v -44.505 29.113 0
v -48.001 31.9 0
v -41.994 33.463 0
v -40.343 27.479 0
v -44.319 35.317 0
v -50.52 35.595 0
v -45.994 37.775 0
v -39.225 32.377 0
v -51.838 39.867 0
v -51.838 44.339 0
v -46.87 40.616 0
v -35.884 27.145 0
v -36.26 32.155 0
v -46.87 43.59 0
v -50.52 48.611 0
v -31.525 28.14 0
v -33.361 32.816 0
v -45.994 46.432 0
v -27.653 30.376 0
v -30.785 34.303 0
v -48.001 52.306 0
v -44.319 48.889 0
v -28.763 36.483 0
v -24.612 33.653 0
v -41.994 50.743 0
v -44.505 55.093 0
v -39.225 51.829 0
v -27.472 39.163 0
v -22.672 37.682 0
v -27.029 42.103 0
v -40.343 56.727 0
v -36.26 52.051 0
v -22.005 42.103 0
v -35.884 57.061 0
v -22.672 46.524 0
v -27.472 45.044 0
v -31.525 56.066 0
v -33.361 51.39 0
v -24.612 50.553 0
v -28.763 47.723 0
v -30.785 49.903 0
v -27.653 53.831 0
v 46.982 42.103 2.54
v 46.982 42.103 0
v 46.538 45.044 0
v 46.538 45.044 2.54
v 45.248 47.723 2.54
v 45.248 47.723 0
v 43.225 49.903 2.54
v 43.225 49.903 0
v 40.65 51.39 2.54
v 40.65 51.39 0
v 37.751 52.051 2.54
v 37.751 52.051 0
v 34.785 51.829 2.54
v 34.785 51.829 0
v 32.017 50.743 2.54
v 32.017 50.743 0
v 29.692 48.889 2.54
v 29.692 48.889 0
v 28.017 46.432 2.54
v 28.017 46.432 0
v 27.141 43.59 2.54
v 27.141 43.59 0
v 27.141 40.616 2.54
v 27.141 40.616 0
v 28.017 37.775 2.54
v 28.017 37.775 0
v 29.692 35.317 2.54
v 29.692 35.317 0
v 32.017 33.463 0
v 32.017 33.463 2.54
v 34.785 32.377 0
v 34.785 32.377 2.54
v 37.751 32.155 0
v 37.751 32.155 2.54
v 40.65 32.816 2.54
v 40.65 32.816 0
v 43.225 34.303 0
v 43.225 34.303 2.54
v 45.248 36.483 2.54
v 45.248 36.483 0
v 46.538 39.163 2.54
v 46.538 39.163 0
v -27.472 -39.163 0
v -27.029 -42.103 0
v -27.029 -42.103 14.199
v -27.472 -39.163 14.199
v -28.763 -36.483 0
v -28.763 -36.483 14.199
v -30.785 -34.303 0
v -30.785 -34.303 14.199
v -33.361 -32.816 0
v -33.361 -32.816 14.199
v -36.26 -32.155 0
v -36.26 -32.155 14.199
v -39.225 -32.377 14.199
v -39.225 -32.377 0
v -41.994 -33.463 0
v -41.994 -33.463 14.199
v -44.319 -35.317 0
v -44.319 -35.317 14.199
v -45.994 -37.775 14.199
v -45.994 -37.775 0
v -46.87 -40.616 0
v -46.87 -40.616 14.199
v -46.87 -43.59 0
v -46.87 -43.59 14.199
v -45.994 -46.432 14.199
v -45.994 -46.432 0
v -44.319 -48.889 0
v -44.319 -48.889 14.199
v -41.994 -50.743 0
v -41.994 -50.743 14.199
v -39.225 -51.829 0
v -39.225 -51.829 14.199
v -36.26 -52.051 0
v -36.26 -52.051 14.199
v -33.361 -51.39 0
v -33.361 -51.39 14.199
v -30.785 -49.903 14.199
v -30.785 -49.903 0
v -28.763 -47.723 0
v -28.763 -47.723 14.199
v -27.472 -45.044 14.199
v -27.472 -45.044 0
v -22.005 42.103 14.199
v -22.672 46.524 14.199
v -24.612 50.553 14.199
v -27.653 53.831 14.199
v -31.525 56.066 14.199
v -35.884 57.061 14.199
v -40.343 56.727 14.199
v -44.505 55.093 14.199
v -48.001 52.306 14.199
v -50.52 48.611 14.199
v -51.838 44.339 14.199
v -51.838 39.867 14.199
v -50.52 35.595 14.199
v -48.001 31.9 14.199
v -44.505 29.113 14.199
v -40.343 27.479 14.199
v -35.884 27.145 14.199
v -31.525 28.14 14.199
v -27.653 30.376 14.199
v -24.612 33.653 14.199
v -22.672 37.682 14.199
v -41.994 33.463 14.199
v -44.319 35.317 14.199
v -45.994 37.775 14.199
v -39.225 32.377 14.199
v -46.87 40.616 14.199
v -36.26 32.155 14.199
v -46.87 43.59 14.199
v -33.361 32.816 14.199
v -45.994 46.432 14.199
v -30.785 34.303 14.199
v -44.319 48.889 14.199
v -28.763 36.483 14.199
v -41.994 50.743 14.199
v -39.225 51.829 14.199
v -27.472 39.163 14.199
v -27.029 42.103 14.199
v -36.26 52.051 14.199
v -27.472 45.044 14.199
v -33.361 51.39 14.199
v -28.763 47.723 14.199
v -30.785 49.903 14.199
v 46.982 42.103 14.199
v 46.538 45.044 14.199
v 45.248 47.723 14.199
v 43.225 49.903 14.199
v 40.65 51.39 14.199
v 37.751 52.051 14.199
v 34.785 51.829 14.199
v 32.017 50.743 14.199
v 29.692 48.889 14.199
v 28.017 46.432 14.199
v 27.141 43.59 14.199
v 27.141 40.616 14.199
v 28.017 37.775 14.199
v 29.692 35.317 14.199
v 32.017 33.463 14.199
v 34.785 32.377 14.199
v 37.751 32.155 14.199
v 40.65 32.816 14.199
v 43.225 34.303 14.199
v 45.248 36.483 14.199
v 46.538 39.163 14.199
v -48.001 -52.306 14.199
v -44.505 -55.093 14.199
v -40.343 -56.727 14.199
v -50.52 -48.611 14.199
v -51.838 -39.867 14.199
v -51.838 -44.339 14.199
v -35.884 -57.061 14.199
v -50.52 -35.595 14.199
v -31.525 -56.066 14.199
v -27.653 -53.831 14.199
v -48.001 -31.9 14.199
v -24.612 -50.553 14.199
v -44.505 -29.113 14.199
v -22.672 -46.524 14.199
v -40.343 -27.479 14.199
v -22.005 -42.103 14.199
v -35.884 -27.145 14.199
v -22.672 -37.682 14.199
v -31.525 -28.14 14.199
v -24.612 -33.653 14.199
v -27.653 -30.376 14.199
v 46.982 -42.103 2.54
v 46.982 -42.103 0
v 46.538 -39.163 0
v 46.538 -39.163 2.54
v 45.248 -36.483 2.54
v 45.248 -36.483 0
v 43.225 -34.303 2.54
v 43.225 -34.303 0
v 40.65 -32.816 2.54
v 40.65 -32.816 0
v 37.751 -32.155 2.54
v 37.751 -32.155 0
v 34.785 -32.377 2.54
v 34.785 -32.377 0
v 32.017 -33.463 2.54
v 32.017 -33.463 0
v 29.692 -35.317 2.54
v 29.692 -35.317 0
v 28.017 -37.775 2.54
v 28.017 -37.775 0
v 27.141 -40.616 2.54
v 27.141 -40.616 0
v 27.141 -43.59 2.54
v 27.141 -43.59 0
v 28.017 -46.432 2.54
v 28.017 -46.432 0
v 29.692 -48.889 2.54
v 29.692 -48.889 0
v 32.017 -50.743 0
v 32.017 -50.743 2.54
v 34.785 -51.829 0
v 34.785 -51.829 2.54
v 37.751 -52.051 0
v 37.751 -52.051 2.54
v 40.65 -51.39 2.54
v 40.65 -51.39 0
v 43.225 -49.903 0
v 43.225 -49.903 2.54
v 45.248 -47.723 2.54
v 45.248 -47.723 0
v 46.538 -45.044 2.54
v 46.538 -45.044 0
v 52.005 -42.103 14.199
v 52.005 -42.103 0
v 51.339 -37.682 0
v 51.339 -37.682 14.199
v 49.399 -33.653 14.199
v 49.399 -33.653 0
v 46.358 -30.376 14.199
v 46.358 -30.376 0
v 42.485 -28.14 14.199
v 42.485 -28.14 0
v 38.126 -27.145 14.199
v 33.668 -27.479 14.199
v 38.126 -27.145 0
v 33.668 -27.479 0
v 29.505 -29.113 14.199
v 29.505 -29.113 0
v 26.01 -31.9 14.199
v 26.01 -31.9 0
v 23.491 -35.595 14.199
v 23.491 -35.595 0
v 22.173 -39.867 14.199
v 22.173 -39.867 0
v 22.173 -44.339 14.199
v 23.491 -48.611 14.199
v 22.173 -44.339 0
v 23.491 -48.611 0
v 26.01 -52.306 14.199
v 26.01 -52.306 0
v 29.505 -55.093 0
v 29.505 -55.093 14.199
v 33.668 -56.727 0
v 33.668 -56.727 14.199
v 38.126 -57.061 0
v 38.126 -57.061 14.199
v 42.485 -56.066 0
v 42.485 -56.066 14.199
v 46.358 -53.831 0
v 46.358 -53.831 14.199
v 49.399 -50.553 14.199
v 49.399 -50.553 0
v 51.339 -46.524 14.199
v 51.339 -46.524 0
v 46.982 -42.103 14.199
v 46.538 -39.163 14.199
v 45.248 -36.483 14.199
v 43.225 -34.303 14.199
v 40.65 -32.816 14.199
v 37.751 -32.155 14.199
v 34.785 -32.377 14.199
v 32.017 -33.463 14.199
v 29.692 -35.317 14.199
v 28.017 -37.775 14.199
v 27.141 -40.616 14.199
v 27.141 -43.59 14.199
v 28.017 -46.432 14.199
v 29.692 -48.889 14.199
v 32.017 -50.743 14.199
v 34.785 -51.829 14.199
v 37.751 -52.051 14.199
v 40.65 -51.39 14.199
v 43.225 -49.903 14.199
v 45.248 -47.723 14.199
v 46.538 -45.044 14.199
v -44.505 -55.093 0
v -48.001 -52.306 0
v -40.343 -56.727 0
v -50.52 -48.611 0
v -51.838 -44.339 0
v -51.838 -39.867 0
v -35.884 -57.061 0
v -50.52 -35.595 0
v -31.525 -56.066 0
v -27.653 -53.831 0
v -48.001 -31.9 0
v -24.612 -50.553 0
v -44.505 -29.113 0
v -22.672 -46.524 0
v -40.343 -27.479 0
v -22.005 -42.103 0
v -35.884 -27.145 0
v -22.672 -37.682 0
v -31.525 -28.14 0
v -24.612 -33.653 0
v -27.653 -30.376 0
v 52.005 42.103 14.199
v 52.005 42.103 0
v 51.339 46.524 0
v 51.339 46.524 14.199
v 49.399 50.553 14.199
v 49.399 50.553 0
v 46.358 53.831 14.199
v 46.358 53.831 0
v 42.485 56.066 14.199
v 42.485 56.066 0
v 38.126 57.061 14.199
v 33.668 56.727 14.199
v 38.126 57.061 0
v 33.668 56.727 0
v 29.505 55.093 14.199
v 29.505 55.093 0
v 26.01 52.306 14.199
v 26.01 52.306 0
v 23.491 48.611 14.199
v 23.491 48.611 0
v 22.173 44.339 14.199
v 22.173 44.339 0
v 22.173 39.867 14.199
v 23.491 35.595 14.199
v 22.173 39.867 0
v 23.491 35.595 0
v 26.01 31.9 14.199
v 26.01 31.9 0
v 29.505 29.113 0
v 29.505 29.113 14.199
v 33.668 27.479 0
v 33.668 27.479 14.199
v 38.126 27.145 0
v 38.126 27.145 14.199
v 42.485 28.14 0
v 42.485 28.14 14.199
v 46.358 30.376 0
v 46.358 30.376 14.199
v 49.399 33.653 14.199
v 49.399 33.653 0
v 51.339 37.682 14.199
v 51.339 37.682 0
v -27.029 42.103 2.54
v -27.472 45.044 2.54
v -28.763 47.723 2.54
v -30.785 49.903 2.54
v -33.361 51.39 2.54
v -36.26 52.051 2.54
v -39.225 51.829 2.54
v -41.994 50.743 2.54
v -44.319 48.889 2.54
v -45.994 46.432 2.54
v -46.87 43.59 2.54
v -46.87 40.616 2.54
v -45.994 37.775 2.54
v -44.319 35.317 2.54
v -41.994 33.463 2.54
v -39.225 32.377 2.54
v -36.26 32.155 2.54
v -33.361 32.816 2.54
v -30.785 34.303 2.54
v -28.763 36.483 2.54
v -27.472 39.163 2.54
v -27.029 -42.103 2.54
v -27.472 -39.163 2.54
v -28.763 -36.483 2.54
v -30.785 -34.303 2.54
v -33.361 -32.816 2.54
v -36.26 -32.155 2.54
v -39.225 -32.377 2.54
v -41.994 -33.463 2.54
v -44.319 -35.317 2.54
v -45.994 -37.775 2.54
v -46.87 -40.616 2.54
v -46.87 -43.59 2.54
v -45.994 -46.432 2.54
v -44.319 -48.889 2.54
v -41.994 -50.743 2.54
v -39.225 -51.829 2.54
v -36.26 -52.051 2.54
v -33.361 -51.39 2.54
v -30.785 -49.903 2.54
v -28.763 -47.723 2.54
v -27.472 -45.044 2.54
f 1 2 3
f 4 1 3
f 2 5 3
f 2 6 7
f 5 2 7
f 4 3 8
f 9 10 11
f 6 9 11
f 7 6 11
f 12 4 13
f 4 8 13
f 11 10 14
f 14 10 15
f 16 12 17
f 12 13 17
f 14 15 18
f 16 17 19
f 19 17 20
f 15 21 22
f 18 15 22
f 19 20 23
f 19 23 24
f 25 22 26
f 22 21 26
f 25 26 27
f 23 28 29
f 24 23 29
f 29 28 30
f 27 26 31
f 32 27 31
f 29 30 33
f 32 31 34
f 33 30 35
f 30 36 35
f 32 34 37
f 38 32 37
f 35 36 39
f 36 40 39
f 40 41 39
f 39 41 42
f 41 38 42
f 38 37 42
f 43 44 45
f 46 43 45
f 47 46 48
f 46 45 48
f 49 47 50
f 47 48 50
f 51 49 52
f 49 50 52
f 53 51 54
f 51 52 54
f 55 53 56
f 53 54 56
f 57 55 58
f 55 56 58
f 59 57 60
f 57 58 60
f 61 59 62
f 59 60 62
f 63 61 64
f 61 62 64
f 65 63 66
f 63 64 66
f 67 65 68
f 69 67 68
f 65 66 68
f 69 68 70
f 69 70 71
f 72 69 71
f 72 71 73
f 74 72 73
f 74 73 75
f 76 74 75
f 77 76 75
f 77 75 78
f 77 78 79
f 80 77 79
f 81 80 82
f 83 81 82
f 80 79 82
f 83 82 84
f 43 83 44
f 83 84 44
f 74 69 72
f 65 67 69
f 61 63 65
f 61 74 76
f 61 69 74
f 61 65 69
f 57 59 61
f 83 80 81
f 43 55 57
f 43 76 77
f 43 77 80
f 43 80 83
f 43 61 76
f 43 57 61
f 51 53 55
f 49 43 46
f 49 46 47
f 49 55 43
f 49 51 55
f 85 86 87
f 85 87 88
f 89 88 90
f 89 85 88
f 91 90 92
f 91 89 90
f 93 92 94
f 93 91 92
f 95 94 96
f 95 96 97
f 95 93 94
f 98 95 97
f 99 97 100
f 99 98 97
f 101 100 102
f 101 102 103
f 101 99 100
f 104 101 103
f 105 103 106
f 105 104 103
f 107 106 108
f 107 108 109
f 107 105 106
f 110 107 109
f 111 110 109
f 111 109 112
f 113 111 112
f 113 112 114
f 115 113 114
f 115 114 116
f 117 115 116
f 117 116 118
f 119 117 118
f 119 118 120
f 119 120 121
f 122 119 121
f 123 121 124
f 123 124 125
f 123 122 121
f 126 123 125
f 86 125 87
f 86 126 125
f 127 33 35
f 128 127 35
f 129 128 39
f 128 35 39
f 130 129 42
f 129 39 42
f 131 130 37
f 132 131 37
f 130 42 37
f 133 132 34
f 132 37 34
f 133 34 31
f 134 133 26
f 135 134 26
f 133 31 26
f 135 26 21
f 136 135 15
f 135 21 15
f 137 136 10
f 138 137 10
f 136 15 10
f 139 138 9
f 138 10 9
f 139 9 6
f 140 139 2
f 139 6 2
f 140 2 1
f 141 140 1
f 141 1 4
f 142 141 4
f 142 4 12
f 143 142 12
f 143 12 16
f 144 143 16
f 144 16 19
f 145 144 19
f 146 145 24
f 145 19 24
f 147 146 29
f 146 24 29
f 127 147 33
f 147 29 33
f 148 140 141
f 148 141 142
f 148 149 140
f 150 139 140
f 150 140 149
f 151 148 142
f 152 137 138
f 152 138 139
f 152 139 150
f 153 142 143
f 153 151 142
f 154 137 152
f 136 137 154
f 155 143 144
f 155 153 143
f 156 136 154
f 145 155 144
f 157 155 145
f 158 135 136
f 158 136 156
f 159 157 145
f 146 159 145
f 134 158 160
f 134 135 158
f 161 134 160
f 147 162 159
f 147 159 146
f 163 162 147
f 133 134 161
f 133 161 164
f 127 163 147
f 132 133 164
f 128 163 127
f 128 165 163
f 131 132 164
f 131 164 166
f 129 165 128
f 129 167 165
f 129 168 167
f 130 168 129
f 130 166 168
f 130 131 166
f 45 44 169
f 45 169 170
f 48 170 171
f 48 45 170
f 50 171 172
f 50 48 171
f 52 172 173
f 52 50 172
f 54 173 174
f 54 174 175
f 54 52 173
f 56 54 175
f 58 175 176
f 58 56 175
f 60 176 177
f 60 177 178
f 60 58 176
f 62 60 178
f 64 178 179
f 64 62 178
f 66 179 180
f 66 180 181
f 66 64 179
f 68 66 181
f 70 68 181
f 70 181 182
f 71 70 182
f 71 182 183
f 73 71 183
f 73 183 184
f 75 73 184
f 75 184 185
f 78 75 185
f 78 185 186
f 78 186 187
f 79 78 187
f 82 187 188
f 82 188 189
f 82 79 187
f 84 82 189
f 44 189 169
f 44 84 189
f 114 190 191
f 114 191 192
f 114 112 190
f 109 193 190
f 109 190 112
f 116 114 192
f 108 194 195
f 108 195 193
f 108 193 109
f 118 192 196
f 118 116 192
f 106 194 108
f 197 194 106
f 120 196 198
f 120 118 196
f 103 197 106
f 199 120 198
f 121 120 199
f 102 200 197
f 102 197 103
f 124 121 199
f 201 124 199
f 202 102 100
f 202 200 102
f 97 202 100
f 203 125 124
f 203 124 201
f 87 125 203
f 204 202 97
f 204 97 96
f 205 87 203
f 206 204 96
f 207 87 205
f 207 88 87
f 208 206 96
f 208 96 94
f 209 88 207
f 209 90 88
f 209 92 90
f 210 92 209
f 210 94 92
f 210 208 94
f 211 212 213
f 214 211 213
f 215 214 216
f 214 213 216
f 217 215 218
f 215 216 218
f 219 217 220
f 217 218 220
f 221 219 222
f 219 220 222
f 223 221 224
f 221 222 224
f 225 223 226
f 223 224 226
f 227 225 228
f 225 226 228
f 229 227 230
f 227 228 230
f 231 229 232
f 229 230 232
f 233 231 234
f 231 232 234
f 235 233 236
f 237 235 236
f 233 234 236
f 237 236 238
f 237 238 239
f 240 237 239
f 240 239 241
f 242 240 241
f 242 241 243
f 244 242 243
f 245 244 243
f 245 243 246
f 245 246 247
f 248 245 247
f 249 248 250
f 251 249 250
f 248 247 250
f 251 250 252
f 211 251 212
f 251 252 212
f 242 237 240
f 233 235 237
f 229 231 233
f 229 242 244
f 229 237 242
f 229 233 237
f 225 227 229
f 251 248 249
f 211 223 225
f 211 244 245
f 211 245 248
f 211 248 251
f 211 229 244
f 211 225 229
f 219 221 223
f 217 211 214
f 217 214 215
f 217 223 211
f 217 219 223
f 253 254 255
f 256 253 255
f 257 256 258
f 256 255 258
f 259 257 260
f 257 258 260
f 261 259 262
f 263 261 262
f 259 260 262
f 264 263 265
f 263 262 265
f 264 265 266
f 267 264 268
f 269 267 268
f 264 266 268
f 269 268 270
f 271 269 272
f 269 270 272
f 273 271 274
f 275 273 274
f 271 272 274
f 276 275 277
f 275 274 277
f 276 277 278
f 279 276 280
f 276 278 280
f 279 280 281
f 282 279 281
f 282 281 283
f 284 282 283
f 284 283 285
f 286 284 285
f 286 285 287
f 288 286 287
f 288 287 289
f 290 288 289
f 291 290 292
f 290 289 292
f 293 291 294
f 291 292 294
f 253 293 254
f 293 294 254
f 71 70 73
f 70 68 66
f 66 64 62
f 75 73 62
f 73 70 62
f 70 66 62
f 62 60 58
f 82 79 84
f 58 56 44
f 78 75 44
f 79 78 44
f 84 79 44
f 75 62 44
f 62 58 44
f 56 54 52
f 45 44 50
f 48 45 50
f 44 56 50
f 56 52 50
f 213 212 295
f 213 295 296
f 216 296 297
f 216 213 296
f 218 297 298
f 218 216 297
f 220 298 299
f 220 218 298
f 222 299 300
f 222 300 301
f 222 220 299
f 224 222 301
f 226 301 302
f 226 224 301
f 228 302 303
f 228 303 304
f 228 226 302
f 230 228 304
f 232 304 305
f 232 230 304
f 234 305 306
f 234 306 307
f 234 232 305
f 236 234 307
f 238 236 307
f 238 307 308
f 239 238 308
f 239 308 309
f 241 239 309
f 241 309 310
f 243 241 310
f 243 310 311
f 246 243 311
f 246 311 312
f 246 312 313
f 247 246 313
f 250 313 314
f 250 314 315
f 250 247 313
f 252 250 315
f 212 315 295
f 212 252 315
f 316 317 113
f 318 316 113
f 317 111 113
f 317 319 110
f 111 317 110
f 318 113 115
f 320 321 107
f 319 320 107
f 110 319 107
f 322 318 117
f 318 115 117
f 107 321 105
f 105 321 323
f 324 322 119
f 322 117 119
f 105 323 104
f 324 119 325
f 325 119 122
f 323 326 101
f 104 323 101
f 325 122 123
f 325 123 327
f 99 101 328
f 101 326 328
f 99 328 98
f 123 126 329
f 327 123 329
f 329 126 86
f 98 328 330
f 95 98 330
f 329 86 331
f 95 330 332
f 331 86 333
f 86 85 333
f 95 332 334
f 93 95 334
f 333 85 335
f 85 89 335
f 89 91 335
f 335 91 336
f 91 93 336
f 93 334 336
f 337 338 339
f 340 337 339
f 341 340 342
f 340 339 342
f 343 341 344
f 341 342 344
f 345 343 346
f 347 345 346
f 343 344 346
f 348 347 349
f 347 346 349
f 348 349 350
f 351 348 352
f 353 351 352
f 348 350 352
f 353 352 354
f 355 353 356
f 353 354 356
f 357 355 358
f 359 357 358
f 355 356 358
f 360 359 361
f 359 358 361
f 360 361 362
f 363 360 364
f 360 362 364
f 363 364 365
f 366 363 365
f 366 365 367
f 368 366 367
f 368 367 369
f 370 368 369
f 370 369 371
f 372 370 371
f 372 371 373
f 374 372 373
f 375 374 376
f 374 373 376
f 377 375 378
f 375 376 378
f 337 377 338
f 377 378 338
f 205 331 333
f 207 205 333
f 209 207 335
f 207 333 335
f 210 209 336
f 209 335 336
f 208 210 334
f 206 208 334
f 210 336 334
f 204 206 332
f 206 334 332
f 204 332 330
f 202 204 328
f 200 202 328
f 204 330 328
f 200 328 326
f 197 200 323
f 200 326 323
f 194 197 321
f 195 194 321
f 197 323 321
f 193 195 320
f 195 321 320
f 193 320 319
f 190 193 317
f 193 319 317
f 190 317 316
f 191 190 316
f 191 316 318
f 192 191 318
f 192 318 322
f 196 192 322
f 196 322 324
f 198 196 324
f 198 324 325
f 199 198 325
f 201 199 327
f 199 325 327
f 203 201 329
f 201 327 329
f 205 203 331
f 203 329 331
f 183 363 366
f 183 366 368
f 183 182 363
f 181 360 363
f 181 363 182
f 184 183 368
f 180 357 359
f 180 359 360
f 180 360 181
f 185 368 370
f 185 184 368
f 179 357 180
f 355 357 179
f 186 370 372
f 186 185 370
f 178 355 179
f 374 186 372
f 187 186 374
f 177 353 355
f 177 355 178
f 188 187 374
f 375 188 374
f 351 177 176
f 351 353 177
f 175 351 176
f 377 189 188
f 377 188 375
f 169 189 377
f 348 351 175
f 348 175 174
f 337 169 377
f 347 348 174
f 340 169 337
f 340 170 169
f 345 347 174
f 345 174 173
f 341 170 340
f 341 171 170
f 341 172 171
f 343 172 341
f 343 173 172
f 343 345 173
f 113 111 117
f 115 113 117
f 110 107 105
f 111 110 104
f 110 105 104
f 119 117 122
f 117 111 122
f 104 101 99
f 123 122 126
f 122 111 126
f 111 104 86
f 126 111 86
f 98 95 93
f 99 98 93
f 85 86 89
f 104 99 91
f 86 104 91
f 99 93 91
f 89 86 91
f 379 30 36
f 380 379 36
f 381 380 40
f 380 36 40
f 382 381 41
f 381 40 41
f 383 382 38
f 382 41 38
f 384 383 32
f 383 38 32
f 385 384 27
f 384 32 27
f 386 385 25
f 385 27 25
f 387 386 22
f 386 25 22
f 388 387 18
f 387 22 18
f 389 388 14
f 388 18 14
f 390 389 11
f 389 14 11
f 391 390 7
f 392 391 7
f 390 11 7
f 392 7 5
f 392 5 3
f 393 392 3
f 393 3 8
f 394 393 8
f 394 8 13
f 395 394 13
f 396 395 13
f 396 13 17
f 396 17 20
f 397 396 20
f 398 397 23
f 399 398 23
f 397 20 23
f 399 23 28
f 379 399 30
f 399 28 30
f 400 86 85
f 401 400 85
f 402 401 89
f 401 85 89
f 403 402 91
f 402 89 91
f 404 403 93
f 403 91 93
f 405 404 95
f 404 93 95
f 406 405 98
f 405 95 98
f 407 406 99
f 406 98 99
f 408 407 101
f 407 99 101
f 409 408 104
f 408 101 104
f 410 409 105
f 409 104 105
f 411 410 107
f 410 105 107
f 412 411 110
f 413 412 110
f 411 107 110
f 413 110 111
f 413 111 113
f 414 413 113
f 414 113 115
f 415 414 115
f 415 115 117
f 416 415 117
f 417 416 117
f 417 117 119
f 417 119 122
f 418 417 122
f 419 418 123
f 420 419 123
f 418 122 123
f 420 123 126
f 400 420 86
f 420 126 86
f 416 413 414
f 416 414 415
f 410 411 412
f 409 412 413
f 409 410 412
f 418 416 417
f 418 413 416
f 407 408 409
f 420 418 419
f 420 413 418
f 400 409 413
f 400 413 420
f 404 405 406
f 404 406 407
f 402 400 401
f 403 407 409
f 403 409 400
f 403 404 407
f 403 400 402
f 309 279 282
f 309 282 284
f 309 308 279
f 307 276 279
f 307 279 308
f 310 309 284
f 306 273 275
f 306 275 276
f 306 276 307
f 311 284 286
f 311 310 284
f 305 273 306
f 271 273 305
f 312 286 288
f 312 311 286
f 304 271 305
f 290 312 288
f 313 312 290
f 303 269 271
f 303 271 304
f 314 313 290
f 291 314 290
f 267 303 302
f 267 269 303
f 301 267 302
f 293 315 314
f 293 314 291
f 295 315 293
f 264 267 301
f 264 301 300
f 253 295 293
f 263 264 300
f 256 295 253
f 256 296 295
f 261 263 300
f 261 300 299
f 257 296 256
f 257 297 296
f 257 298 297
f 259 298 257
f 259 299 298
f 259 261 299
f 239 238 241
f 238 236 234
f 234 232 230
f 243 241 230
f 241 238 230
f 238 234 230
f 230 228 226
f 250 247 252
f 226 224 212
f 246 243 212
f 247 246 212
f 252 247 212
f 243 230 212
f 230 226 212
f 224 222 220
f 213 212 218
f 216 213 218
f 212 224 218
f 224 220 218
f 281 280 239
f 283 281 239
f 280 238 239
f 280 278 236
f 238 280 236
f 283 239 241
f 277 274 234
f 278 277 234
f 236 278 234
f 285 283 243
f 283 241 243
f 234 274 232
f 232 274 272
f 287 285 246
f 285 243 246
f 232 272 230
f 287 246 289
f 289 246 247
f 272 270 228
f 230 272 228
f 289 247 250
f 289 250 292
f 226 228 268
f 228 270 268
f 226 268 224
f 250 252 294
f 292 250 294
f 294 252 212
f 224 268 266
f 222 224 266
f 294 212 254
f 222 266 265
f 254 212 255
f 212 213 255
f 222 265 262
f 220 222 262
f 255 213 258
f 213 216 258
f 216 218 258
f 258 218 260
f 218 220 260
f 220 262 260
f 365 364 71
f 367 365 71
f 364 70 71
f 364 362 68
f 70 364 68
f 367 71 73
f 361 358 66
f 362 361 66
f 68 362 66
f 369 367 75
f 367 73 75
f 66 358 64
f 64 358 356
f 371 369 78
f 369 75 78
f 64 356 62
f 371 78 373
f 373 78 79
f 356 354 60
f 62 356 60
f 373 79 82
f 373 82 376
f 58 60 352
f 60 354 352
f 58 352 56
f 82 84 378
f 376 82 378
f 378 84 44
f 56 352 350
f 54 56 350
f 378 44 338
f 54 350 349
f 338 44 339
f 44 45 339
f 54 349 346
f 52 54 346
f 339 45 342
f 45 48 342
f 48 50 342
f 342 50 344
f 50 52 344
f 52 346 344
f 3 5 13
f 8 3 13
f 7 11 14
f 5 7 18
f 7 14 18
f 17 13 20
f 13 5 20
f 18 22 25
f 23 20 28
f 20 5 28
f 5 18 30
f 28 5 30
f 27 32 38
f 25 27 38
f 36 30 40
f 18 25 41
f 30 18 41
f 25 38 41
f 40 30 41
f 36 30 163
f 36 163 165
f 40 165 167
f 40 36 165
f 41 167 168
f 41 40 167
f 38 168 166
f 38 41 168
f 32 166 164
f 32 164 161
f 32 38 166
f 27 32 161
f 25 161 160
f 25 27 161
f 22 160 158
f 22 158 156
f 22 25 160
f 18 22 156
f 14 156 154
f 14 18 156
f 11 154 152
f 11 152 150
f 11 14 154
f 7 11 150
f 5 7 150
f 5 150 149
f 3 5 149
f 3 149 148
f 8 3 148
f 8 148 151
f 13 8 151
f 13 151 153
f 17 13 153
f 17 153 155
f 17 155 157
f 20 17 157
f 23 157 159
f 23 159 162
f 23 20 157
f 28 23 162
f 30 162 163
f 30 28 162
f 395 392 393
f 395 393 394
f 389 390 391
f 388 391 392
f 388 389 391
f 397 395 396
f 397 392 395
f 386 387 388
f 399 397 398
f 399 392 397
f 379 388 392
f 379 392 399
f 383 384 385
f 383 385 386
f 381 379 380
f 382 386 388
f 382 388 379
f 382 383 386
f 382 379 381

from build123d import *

# Parameters (mm, degrees)
F0_R     = 14.99997
F0_R_2   = 9.976283
F1_DEPTH = 14.1986
F2_DEPTH = 2.54
F3_DEPTH = 2.54


with BuildPart() as f1:
    # F0 (on Top) → F1 (new body)
    with BuildSketch(Plane.XY):
        with Locations((37.00538, -42.103067)):
            Circle(F0_R)
        with Locations((37.00538, -42.103067)):
            Circle(F0_R_2, mode=Mode.SUBTRACT)
        with Locations((37.00538, 42.103067)):
            Circle(F0_R)
        with Locations((37.00538, 42.103067)):
            Circle(F0_R_2, mode=Mode.SUBTRACT)
        with Locations((-37.00538, -42.103067)):
            Circle(F0_R)
        with Locations((-37.00538, -42.103067)):
            Circle(F0_R_2, mode=Mode.SUBTRACT)
        with Locations((-37.00538, 42.103067)):
            Circle(F0_R)
        with Locations((-37.00538, 42.103067)):
            Circle(F0_R_2, mode=Mode.SUBTRACT)
    extrude(amount=F1_DEPTH)


with BuildPart() as f2:
    # F0 (on Top) → F2 (new body)
    with BuildSketch(Plane.XY):
        with Locations((37.00538, 42.103067)):
            Circle(F0_R_2)
        with Locations((37.00538, -42.103067)):
            Circle(F0_R_2)
    extrude(amount=F2_DEPTH)


with BuildPart() as f3:
    # F0 (on Top) → F3 (new body)
    with BuildSketch(Plane.XY):
        with Locations((-37.00538, -42.103067)):
            Circle(F0_R_2)
        with Locations((-37.00538, 42.103067)):
            Circle(F0_R_2)
    extrude(amount=F3_DEPTH)


solid = Compound([f1.part, f2.part, f3.part])
